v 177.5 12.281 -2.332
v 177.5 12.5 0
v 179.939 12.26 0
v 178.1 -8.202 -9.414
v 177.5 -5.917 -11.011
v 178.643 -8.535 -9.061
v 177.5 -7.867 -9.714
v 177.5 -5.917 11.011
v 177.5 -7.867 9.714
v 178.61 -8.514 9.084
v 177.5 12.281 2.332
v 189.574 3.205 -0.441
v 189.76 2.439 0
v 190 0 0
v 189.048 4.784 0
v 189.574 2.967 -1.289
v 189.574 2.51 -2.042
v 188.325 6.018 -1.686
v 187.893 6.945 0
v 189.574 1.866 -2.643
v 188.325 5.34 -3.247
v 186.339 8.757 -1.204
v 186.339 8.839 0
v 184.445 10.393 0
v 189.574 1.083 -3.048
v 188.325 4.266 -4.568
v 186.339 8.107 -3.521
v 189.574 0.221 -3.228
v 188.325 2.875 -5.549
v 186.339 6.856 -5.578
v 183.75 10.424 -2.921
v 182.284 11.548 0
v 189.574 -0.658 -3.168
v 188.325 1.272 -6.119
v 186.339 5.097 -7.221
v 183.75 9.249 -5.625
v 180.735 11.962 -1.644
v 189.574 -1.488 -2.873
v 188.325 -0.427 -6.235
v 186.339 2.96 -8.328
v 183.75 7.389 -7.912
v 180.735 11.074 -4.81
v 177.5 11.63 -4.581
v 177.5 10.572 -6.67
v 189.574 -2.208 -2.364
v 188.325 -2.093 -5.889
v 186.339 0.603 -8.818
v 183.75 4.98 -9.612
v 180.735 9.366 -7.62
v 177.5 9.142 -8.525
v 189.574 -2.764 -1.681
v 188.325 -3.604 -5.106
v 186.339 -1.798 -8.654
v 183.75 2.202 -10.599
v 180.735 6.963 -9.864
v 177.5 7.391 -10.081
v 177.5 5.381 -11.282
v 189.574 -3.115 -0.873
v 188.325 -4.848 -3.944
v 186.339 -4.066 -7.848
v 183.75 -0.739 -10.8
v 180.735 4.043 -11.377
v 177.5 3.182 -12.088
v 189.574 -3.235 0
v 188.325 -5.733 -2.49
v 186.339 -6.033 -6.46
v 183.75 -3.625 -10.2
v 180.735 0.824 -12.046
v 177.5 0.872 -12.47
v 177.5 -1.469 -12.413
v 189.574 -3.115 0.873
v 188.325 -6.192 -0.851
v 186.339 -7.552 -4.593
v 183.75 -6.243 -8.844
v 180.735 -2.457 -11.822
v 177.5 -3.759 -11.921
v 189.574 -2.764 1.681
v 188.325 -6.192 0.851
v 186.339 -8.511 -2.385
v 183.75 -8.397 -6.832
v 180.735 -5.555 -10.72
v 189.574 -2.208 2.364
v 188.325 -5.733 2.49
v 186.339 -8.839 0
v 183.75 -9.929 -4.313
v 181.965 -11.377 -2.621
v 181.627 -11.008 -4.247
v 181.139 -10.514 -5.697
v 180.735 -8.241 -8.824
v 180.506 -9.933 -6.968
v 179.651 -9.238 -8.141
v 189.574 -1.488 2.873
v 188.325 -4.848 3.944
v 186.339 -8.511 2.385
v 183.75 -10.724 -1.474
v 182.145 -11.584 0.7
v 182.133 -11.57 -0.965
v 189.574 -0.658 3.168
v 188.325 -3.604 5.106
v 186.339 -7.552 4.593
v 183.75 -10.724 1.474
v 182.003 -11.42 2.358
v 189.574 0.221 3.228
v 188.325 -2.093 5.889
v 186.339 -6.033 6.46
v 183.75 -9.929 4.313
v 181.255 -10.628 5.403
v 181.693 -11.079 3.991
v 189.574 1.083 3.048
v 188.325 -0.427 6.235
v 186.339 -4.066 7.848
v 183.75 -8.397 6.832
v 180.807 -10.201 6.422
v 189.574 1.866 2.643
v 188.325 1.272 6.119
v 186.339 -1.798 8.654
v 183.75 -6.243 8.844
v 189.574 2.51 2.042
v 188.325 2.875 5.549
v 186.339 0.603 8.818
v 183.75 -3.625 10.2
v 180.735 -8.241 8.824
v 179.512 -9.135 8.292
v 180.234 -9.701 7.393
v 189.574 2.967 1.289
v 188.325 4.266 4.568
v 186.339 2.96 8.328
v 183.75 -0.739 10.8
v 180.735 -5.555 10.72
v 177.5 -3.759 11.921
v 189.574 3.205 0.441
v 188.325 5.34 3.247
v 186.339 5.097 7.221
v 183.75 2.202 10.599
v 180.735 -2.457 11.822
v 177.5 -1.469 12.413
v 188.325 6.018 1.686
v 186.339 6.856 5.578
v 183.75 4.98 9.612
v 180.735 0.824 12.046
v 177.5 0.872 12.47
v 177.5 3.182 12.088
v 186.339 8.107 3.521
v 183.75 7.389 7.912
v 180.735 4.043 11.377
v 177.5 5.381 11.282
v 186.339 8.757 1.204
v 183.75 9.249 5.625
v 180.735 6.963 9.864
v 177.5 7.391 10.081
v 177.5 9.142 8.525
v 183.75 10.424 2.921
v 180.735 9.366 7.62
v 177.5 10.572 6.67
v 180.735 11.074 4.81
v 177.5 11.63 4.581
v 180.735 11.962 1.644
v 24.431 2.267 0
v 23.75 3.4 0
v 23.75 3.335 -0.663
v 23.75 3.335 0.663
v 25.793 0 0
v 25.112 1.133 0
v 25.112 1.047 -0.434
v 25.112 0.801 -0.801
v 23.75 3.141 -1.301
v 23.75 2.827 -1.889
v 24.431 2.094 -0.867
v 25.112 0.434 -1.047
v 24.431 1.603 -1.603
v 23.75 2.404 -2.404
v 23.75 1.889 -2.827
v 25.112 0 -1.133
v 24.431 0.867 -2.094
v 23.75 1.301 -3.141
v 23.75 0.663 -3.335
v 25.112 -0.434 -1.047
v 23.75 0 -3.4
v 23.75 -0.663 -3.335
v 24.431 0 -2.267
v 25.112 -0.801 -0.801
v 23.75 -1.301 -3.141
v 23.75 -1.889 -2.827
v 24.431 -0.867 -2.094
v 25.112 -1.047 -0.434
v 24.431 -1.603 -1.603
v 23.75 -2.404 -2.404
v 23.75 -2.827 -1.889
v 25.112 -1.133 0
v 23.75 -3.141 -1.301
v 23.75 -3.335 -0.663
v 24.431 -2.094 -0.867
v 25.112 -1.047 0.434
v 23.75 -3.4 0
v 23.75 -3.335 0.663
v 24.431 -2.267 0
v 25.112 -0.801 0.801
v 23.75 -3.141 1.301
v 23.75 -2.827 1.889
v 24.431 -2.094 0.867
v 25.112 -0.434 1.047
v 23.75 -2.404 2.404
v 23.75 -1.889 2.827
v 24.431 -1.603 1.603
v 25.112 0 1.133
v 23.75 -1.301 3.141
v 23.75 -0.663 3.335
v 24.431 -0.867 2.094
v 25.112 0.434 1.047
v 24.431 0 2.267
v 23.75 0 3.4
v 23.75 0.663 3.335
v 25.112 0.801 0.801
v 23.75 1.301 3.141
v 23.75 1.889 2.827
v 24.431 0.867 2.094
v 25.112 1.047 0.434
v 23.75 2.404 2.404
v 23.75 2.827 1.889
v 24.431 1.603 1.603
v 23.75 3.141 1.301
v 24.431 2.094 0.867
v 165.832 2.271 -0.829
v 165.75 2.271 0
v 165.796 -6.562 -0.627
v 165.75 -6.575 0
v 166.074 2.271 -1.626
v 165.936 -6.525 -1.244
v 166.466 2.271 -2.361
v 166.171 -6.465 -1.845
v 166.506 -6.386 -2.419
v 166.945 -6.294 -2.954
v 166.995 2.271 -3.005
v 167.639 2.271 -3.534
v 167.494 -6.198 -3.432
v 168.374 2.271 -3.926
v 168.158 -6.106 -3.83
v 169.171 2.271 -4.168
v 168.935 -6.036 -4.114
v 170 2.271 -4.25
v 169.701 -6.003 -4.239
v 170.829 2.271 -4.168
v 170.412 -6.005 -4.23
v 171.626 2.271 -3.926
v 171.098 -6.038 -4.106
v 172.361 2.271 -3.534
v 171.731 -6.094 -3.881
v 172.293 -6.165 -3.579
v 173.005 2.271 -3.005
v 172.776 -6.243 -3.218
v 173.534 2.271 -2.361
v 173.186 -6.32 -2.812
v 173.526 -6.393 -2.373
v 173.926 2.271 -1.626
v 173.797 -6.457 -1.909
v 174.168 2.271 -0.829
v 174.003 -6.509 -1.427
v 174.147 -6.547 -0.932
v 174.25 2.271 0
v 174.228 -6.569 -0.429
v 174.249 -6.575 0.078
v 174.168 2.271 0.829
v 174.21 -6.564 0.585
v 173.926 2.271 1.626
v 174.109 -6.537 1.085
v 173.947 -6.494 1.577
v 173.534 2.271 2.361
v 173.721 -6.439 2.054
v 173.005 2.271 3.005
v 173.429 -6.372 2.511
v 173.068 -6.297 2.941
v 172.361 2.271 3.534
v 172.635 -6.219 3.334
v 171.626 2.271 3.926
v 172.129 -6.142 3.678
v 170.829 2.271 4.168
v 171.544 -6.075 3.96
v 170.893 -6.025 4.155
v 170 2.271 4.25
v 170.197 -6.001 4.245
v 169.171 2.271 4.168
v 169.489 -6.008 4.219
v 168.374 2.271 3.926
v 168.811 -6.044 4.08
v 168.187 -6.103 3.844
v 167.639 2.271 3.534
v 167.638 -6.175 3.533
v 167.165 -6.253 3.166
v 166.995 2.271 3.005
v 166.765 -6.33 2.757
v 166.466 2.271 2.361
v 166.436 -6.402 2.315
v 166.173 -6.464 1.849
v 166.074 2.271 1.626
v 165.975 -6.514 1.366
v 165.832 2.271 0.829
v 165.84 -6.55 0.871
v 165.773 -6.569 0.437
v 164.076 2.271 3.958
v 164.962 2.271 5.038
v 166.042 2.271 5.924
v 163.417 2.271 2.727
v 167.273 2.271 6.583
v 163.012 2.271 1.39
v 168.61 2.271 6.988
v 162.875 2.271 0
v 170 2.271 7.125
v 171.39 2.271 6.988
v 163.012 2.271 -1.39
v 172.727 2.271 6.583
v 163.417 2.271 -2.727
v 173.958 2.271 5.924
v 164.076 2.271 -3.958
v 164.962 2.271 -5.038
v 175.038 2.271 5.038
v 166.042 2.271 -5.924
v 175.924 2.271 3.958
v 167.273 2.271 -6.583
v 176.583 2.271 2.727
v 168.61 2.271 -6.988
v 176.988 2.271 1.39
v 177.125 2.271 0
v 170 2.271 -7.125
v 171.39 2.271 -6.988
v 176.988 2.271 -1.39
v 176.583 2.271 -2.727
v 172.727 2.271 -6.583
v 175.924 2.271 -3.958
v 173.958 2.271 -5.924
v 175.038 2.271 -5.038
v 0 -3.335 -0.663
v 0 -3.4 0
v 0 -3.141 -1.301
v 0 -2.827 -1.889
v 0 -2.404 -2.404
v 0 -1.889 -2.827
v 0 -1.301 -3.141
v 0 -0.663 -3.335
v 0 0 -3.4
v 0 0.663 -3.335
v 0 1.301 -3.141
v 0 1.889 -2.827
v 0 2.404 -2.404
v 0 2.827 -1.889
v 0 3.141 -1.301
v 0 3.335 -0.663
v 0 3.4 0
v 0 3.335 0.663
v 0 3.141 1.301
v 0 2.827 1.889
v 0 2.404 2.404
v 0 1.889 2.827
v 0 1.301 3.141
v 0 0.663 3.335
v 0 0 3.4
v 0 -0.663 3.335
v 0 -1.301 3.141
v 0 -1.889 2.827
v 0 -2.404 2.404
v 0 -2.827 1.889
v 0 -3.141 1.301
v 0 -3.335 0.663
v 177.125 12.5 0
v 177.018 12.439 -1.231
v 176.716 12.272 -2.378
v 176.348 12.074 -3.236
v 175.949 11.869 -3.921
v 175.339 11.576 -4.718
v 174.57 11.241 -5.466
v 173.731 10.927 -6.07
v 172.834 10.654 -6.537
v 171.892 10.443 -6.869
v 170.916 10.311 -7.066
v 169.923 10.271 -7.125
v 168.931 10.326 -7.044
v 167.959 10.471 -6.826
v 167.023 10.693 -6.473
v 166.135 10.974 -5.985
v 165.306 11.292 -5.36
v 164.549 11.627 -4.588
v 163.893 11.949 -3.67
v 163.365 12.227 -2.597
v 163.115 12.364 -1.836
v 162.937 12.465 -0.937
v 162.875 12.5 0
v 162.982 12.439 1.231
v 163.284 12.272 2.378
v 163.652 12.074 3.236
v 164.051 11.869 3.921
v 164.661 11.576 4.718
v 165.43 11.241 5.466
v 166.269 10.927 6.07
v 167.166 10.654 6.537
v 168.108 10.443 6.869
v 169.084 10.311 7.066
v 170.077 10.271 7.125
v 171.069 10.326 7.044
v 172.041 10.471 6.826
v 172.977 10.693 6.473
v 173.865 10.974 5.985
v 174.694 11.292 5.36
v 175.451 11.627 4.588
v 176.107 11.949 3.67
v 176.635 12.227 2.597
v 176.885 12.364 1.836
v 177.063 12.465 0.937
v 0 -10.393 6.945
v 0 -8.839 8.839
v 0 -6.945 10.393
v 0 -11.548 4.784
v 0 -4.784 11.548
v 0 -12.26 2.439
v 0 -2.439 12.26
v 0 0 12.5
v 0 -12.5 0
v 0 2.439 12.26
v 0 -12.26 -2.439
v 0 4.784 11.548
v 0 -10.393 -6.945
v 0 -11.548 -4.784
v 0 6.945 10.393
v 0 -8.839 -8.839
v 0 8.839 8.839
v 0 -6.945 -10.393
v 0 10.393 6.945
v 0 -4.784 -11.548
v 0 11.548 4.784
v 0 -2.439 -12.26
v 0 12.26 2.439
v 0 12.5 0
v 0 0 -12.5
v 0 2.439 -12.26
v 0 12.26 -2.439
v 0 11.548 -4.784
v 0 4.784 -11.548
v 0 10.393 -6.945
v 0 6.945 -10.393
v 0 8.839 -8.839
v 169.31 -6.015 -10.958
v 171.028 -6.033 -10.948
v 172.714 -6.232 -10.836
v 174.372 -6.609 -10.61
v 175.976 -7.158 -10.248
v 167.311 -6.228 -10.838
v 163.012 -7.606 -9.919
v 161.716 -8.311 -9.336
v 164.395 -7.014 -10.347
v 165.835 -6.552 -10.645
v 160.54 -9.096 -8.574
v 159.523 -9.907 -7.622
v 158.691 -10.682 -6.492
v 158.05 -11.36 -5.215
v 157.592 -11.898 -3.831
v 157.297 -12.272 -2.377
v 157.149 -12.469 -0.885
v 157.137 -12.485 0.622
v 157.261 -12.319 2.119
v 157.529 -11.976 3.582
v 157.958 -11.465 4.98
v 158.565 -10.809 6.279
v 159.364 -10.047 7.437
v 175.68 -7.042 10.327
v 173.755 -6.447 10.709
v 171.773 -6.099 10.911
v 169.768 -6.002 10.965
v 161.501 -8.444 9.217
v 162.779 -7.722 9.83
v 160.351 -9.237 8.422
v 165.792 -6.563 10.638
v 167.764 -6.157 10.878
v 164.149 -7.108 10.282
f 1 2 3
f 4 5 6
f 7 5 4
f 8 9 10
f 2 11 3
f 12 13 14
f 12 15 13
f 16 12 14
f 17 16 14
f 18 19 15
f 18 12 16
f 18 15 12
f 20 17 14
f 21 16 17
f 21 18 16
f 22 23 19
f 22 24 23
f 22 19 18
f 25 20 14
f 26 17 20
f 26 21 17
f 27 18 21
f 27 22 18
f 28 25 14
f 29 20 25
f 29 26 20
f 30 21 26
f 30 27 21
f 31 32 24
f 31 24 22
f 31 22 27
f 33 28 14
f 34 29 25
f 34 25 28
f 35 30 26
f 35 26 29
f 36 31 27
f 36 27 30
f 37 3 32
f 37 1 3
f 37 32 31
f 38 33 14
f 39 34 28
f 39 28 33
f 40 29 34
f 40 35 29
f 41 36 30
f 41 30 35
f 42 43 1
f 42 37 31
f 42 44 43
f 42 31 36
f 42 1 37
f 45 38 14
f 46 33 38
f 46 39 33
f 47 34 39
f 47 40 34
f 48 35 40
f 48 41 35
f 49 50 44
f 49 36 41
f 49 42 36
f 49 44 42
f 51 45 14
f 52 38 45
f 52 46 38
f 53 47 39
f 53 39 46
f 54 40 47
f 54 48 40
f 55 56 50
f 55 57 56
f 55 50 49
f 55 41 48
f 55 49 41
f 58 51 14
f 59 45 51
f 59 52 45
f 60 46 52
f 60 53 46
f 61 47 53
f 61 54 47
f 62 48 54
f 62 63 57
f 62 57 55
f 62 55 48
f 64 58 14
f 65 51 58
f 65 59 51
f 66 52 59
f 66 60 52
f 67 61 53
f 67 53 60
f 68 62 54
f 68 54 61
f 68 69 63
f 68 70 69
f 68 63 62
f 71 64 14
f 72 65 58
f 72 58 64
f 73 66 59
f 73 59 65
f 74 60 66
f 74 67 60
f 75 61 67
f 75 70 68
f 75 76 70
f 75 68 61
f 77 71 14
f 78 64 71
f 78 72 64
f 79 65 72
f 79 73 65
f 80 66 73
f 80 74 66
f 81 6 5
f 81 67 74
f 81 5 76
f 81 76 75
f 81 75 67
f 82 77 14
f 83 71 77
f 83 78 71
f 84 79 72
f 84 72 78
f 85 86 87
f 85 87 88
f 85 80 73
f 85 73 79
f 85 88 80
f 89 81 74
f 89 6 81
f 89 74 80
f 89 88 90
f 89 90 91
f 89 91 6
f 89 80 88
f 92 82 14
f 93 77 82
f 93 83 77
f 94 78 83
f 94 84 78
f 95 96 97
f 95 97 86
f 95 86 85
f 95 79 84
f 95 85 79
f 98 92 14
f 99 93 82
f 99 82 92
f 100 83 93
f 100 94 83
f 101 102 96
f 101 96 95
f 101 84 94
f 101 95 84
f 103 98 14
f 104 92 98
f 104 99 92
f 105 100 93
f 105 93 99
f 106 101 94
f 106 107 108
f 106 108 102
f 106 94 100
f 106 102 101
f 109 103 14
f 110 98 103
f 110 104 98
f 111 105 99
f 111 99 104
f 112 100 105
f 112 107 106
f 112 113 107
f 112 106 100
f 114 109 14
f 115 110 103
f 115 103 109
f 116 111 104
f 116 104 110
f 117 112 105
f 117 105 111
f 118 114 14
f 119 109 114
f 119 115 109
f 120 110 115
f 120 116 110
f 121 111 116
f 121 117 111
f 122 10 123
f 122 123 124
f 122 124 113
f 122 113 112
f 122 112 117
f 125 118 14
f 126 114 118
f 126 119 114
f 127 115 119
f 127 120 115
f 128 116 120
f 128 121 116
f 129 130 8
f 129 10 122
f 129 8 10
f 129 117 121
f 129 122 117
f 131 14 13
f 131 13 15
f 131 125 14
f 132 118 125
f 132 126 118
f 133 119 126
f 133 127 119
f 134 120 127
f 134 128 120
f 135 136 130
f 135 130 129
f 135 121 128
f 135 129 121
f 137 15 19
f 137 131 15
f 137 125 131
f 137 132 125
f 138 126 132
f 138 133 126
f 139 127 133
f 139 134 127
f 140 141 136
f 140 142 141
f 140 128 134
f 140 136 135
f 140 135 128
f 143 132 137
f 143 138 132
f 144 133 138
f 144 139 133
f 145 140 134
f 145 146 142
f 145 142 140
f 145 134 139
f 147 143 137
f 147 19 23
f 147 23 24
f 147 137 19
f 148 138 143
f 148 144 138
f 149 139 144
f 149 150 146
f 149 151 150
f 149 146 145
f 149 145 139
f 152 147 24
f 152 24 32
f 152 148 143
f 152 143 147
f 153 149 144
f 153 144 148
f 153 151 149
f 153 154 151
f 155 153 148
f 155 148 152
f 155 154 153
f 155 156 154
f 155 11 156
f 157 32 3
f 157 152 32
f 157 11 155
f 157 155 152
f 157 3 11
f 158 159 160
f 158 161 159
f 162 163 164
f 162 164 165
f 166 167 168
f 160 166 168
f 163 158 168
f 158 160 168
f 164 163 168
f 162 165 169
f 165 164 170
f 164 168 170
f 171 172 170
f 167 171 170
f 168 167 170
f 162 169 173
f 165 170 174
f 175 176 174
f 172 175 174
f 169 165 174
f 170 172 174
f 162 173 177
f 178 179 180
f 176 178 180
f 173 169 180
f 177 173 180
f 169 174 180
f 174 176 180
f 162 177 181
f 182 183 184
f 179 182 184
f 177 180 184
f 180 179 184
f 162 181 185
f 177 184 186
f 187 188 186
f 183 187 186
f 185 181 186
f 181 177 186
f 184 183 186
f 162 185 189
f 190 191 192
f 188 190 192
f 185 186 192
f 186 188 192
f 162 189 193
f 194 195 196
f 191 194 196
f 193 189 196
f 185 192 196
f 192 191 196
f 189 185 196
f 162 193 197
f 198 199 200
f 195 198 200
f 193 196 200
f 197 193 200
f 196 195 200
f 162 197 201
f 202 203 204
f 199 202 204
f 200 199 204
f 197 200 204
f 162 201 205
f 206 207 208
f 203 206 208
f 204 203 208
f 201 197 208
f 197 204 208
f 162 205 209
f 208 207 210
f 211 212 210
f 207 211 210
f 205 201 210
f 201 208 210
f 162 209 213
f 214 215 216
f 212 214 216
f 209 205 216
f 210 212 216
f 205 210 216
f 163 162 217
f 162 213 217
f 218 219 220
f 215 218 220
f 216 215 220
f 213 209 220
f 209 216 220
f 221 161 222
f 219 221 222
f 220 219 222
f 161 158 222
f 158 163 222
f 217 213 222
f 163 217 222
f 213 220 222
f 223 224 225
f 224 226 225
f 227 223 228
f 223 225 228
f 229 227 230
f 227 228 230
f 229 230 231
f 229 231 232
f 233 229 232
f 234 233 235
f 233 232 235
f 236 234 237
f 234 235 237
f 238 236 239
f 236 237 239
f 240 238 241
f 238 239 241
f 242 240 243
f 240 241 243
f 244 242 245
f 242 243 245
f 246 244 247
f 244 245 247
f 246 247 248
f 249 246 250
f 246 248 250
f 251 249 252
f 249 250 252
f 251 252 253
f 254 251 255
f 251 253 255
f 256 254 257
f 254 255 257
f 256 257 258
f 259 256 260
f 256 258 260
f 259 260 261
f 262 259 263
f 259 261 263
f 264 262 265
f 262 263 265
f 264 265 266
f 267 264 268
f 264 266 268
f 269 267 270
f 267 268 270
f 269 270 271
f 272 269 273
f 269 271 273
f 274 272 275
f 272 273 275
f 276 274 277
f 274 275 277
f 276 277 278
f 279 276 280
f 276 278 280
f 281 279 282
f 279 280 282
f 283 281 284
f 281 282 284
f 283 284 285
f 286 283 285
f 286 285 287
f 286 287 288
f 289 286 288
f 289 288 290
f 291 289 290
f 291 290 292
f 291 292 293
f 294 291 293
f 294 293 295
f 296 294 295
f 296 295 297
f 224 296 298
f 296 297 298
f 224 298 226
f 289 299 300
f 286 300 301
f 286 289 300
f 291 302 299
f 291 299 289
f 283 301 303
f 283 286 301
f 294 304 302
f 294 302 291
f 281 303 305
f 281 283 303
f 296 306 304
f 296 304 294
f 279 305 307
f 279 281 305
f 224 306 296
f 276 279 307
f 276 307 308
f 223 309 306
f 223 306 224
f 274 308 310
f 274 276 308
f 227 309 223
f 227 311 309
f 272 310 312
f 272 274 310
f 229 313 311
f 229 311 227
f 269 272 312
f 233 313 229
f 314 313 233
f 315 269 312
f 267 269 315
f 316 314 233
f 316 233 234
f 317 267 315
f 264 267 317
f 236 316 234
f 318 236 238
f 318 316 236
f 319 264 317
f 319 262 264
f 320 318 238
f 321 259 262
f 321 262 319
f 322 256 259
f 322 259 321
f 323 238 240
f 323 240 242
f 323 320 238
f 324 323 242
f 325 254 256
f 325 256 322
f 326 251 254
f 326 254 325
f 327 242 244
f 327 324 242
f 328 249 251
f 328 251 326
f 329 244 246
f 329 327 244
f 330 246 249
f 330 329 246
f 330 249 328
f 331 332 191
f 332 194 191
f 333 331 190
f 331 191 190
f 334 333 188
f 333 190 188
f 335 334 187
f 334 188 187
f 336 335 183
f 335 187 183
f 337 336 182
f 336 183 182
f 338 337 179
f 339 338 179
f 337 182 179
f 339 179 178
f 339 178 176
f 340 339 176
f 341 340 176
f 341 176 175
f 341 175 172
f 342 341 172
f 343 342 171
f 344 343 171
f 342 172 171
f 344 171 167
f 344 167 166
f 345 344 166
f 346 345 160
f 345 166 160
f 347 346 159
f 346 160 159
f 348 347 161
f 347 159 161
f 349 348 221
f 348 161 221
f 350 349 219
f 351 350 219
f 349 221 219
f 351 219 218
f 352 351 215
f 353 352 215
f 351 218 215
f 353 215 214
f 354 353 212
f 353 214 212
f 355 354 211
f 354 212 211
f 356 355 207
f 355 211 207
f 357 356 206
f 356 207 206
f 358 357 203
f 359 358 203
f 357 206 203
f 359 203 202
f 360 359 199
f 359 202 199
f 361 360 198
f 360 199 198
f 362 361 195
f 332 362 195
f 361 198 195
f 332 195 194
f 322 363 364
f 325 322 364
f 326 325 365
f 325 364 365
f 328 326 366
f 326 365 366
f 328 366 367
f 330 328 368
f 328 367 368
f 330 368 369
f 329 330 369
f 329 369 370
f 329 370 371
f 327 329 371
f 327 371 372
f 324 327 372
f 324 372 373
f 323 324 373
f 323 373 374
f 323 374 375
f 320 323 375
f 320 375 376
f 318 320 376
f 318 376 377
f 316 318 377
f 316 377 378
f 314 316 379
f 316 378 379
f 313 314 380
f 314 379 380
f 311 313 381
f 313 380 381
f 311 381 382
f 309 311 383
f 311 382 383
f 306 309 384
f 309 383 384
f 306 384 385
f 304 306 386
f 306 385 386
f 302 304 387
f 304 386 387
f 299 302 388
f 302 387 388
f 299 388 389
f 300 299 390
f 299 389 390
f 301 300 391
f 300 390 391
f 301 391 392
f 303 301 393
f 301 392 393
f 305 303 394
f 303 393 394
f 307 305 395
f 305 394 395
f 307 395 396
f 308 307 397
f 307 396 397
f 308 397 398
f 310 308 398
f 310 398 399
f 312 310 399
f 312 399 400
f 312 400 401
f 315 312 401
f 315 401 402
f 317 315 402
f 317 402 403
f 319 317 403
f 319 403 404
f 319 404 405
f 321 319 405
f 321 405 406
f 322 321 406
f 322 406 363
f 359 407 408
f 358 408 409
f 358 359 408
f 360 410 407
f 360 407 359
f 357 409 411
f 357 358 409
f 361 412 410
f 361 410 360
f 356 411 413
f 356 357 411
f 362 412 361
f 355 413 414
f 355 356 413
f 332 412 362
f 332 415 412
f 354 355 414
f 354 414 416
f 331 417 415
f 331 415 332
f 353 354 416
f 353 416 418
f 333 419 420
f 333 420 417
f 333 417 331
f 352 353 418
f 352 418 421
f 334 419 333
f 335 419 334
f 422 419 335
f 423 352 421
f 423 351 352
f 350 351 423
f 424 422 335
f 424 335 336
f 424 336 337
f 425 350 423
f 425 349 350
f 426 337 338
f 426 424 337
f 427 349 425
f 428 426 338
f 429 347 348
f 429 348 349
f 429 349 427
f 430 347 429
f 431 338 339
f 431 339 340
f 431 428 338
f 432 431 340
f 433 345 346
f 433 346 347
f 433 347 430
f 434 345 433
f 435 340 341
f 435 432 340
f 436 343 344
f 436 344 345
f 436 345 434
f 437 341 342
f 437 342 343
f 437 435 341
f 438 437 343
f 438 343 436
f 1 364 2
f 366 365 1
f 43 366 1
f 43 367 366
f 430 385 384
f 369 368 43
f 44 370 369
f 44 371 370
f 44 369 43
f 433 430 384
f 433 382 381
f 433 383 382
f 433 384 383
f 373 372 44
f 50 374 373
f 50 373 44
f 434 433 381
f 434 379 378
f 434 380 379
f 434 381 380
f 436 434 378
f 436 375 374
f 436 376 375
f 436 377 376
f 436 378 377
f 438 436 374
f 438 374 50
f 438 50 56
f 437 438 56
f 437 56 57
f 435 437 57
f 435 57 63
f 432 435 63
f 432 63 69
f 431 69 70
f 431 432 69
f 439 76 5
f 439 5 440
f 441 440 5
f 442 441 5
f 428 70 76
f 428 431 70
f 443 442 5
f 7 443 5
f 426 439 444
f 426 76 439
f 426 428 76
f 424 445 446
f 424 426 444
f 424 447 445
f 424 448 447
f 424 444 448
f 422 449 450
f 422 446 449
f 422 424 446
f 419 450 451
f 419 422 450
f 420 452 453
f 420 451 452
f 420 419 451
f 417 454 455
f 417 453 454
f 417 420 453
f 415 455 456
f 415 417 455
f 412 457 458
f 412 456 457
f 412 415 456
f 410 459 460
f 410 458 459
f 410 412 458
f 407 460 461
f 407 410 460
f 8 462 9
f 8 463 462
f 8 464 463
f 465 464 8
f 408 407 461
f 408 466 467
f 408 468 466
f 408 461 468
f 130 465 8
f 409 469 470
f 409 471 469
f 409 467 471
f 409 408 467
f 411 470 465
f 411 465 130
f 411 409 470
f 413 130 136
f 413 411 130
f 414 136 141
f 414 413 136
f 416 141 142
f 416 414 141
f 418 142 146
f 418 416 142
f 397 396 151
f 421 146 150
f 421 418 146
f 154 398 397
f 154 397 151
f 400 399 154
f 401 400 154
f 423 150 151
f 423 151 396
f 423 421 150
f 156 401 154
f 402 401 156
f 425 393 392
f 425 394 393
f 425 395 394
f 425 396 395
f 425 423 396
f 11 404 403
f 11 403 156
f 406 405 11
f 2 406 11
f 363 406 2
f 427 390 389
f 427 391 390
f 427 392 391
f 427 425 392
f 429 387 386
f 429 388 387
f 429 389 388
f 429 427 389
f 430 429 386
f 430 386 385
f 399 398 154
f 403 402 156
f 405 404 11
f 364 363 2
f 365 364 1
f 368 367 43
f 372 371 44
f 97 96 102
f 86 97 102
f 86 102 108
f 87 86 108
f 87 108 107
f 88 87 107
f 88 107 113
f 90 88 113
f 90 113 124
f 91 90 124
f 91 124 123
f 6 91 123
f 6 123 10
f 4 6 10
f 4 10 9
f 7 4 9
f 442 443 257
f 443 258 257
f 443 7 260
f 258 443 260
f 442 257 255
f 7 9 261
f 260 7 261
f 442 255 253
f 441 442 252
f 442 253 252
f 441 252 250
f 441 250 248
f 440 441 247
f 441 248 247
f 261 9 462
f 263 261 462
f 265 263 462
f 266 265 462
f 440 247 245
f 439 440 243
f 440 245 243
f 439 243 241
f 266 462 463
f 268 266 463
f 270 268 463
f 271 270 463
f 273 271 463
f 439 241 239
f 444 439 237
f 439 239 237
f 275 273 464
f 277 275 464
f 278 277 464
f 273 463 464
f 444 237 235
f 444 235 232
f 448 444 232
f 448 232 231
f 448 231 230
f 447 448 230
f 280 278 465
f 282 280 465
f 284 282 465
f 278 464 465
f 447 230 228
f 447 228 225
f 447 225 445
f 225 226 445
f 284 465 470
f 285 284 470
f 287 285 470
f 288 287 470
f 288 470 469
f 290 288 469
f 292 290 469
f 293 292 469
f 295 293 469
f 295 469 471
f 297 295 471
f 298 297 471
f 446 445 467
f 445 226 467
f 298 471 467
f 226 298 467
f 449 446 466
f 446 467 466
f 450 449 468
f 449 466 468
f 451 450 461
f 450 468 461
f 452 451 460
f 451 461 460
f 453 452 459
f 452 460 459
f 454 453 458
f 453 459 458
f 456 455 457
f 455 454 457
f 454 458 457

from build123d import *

# Parameters (mm, degrees)
F3_R           = 16
F4_DEPTH       = 15
F6_D           = 6.8
F6_DEPTH       = 23.75
F6_TIP         = 2.0429261047
F9_D           = 8.5
F9_START       = 2.2294414
F9_CBORE_D     = 14.25
F9_CBORE_DEPTH = 8


with BuildPart() as f2:
    # F0 (on Top) → F2 (revolve)
    with BuildSketch(Plane.XY):
        with BuildLine():
            Line((0, 12.5), (0, 0))
            Line((0, 0), (190, 0))
            ThreePointArc((190, 0), (186.3388347648, 8.8388347648), (177.5, 12.5))
            Line((177.5, 12.5), (0, 12.5))
        make_face()
    revolve(axis=Axis((6.2984433025, 0, 0), (-1, 0, 0)))

    # F3 (on Top) → F4 (cut, symmetric)
    with BuildSketch(Plane.XY):
        with Locations((170, -22)):
            Circle(F3_R)
    extrude(amount=F4_DEPTH, both=True, mode=Mode.SUBTRACT)

    # F6
    with Locations(Plane(origin=(0, 0, 0), x_dir=(0, 1, 0), z_dir=(-1, 0, 0))):
        with Locations((0, 0)):
            Hole(F6_D / 2, depth=F6_DEPTH)
            with Locations((0, 0, -(F6_DEPTH + F6_TIP / 2))):  # 118° drill point
                Cone(0, F6_D / 2, F6_TIP, mode=Mode.SUBTRACT)

    # F9 (through all)
    # its depths count from where the whole tool has entered the part; down to there all is cleared
    with Locations(Plane(origin=(0, 12.5, 0), x_dir=(1, 0, 0), z_dir=(0, 1, 0)).offset(-F9_START)):
        with Locations((170, 0)):
            CounterBoreHole(F9_D / 2, F9_CBORE_D / 2, F9_CBORE_DEPTH)


solid = f2.part
